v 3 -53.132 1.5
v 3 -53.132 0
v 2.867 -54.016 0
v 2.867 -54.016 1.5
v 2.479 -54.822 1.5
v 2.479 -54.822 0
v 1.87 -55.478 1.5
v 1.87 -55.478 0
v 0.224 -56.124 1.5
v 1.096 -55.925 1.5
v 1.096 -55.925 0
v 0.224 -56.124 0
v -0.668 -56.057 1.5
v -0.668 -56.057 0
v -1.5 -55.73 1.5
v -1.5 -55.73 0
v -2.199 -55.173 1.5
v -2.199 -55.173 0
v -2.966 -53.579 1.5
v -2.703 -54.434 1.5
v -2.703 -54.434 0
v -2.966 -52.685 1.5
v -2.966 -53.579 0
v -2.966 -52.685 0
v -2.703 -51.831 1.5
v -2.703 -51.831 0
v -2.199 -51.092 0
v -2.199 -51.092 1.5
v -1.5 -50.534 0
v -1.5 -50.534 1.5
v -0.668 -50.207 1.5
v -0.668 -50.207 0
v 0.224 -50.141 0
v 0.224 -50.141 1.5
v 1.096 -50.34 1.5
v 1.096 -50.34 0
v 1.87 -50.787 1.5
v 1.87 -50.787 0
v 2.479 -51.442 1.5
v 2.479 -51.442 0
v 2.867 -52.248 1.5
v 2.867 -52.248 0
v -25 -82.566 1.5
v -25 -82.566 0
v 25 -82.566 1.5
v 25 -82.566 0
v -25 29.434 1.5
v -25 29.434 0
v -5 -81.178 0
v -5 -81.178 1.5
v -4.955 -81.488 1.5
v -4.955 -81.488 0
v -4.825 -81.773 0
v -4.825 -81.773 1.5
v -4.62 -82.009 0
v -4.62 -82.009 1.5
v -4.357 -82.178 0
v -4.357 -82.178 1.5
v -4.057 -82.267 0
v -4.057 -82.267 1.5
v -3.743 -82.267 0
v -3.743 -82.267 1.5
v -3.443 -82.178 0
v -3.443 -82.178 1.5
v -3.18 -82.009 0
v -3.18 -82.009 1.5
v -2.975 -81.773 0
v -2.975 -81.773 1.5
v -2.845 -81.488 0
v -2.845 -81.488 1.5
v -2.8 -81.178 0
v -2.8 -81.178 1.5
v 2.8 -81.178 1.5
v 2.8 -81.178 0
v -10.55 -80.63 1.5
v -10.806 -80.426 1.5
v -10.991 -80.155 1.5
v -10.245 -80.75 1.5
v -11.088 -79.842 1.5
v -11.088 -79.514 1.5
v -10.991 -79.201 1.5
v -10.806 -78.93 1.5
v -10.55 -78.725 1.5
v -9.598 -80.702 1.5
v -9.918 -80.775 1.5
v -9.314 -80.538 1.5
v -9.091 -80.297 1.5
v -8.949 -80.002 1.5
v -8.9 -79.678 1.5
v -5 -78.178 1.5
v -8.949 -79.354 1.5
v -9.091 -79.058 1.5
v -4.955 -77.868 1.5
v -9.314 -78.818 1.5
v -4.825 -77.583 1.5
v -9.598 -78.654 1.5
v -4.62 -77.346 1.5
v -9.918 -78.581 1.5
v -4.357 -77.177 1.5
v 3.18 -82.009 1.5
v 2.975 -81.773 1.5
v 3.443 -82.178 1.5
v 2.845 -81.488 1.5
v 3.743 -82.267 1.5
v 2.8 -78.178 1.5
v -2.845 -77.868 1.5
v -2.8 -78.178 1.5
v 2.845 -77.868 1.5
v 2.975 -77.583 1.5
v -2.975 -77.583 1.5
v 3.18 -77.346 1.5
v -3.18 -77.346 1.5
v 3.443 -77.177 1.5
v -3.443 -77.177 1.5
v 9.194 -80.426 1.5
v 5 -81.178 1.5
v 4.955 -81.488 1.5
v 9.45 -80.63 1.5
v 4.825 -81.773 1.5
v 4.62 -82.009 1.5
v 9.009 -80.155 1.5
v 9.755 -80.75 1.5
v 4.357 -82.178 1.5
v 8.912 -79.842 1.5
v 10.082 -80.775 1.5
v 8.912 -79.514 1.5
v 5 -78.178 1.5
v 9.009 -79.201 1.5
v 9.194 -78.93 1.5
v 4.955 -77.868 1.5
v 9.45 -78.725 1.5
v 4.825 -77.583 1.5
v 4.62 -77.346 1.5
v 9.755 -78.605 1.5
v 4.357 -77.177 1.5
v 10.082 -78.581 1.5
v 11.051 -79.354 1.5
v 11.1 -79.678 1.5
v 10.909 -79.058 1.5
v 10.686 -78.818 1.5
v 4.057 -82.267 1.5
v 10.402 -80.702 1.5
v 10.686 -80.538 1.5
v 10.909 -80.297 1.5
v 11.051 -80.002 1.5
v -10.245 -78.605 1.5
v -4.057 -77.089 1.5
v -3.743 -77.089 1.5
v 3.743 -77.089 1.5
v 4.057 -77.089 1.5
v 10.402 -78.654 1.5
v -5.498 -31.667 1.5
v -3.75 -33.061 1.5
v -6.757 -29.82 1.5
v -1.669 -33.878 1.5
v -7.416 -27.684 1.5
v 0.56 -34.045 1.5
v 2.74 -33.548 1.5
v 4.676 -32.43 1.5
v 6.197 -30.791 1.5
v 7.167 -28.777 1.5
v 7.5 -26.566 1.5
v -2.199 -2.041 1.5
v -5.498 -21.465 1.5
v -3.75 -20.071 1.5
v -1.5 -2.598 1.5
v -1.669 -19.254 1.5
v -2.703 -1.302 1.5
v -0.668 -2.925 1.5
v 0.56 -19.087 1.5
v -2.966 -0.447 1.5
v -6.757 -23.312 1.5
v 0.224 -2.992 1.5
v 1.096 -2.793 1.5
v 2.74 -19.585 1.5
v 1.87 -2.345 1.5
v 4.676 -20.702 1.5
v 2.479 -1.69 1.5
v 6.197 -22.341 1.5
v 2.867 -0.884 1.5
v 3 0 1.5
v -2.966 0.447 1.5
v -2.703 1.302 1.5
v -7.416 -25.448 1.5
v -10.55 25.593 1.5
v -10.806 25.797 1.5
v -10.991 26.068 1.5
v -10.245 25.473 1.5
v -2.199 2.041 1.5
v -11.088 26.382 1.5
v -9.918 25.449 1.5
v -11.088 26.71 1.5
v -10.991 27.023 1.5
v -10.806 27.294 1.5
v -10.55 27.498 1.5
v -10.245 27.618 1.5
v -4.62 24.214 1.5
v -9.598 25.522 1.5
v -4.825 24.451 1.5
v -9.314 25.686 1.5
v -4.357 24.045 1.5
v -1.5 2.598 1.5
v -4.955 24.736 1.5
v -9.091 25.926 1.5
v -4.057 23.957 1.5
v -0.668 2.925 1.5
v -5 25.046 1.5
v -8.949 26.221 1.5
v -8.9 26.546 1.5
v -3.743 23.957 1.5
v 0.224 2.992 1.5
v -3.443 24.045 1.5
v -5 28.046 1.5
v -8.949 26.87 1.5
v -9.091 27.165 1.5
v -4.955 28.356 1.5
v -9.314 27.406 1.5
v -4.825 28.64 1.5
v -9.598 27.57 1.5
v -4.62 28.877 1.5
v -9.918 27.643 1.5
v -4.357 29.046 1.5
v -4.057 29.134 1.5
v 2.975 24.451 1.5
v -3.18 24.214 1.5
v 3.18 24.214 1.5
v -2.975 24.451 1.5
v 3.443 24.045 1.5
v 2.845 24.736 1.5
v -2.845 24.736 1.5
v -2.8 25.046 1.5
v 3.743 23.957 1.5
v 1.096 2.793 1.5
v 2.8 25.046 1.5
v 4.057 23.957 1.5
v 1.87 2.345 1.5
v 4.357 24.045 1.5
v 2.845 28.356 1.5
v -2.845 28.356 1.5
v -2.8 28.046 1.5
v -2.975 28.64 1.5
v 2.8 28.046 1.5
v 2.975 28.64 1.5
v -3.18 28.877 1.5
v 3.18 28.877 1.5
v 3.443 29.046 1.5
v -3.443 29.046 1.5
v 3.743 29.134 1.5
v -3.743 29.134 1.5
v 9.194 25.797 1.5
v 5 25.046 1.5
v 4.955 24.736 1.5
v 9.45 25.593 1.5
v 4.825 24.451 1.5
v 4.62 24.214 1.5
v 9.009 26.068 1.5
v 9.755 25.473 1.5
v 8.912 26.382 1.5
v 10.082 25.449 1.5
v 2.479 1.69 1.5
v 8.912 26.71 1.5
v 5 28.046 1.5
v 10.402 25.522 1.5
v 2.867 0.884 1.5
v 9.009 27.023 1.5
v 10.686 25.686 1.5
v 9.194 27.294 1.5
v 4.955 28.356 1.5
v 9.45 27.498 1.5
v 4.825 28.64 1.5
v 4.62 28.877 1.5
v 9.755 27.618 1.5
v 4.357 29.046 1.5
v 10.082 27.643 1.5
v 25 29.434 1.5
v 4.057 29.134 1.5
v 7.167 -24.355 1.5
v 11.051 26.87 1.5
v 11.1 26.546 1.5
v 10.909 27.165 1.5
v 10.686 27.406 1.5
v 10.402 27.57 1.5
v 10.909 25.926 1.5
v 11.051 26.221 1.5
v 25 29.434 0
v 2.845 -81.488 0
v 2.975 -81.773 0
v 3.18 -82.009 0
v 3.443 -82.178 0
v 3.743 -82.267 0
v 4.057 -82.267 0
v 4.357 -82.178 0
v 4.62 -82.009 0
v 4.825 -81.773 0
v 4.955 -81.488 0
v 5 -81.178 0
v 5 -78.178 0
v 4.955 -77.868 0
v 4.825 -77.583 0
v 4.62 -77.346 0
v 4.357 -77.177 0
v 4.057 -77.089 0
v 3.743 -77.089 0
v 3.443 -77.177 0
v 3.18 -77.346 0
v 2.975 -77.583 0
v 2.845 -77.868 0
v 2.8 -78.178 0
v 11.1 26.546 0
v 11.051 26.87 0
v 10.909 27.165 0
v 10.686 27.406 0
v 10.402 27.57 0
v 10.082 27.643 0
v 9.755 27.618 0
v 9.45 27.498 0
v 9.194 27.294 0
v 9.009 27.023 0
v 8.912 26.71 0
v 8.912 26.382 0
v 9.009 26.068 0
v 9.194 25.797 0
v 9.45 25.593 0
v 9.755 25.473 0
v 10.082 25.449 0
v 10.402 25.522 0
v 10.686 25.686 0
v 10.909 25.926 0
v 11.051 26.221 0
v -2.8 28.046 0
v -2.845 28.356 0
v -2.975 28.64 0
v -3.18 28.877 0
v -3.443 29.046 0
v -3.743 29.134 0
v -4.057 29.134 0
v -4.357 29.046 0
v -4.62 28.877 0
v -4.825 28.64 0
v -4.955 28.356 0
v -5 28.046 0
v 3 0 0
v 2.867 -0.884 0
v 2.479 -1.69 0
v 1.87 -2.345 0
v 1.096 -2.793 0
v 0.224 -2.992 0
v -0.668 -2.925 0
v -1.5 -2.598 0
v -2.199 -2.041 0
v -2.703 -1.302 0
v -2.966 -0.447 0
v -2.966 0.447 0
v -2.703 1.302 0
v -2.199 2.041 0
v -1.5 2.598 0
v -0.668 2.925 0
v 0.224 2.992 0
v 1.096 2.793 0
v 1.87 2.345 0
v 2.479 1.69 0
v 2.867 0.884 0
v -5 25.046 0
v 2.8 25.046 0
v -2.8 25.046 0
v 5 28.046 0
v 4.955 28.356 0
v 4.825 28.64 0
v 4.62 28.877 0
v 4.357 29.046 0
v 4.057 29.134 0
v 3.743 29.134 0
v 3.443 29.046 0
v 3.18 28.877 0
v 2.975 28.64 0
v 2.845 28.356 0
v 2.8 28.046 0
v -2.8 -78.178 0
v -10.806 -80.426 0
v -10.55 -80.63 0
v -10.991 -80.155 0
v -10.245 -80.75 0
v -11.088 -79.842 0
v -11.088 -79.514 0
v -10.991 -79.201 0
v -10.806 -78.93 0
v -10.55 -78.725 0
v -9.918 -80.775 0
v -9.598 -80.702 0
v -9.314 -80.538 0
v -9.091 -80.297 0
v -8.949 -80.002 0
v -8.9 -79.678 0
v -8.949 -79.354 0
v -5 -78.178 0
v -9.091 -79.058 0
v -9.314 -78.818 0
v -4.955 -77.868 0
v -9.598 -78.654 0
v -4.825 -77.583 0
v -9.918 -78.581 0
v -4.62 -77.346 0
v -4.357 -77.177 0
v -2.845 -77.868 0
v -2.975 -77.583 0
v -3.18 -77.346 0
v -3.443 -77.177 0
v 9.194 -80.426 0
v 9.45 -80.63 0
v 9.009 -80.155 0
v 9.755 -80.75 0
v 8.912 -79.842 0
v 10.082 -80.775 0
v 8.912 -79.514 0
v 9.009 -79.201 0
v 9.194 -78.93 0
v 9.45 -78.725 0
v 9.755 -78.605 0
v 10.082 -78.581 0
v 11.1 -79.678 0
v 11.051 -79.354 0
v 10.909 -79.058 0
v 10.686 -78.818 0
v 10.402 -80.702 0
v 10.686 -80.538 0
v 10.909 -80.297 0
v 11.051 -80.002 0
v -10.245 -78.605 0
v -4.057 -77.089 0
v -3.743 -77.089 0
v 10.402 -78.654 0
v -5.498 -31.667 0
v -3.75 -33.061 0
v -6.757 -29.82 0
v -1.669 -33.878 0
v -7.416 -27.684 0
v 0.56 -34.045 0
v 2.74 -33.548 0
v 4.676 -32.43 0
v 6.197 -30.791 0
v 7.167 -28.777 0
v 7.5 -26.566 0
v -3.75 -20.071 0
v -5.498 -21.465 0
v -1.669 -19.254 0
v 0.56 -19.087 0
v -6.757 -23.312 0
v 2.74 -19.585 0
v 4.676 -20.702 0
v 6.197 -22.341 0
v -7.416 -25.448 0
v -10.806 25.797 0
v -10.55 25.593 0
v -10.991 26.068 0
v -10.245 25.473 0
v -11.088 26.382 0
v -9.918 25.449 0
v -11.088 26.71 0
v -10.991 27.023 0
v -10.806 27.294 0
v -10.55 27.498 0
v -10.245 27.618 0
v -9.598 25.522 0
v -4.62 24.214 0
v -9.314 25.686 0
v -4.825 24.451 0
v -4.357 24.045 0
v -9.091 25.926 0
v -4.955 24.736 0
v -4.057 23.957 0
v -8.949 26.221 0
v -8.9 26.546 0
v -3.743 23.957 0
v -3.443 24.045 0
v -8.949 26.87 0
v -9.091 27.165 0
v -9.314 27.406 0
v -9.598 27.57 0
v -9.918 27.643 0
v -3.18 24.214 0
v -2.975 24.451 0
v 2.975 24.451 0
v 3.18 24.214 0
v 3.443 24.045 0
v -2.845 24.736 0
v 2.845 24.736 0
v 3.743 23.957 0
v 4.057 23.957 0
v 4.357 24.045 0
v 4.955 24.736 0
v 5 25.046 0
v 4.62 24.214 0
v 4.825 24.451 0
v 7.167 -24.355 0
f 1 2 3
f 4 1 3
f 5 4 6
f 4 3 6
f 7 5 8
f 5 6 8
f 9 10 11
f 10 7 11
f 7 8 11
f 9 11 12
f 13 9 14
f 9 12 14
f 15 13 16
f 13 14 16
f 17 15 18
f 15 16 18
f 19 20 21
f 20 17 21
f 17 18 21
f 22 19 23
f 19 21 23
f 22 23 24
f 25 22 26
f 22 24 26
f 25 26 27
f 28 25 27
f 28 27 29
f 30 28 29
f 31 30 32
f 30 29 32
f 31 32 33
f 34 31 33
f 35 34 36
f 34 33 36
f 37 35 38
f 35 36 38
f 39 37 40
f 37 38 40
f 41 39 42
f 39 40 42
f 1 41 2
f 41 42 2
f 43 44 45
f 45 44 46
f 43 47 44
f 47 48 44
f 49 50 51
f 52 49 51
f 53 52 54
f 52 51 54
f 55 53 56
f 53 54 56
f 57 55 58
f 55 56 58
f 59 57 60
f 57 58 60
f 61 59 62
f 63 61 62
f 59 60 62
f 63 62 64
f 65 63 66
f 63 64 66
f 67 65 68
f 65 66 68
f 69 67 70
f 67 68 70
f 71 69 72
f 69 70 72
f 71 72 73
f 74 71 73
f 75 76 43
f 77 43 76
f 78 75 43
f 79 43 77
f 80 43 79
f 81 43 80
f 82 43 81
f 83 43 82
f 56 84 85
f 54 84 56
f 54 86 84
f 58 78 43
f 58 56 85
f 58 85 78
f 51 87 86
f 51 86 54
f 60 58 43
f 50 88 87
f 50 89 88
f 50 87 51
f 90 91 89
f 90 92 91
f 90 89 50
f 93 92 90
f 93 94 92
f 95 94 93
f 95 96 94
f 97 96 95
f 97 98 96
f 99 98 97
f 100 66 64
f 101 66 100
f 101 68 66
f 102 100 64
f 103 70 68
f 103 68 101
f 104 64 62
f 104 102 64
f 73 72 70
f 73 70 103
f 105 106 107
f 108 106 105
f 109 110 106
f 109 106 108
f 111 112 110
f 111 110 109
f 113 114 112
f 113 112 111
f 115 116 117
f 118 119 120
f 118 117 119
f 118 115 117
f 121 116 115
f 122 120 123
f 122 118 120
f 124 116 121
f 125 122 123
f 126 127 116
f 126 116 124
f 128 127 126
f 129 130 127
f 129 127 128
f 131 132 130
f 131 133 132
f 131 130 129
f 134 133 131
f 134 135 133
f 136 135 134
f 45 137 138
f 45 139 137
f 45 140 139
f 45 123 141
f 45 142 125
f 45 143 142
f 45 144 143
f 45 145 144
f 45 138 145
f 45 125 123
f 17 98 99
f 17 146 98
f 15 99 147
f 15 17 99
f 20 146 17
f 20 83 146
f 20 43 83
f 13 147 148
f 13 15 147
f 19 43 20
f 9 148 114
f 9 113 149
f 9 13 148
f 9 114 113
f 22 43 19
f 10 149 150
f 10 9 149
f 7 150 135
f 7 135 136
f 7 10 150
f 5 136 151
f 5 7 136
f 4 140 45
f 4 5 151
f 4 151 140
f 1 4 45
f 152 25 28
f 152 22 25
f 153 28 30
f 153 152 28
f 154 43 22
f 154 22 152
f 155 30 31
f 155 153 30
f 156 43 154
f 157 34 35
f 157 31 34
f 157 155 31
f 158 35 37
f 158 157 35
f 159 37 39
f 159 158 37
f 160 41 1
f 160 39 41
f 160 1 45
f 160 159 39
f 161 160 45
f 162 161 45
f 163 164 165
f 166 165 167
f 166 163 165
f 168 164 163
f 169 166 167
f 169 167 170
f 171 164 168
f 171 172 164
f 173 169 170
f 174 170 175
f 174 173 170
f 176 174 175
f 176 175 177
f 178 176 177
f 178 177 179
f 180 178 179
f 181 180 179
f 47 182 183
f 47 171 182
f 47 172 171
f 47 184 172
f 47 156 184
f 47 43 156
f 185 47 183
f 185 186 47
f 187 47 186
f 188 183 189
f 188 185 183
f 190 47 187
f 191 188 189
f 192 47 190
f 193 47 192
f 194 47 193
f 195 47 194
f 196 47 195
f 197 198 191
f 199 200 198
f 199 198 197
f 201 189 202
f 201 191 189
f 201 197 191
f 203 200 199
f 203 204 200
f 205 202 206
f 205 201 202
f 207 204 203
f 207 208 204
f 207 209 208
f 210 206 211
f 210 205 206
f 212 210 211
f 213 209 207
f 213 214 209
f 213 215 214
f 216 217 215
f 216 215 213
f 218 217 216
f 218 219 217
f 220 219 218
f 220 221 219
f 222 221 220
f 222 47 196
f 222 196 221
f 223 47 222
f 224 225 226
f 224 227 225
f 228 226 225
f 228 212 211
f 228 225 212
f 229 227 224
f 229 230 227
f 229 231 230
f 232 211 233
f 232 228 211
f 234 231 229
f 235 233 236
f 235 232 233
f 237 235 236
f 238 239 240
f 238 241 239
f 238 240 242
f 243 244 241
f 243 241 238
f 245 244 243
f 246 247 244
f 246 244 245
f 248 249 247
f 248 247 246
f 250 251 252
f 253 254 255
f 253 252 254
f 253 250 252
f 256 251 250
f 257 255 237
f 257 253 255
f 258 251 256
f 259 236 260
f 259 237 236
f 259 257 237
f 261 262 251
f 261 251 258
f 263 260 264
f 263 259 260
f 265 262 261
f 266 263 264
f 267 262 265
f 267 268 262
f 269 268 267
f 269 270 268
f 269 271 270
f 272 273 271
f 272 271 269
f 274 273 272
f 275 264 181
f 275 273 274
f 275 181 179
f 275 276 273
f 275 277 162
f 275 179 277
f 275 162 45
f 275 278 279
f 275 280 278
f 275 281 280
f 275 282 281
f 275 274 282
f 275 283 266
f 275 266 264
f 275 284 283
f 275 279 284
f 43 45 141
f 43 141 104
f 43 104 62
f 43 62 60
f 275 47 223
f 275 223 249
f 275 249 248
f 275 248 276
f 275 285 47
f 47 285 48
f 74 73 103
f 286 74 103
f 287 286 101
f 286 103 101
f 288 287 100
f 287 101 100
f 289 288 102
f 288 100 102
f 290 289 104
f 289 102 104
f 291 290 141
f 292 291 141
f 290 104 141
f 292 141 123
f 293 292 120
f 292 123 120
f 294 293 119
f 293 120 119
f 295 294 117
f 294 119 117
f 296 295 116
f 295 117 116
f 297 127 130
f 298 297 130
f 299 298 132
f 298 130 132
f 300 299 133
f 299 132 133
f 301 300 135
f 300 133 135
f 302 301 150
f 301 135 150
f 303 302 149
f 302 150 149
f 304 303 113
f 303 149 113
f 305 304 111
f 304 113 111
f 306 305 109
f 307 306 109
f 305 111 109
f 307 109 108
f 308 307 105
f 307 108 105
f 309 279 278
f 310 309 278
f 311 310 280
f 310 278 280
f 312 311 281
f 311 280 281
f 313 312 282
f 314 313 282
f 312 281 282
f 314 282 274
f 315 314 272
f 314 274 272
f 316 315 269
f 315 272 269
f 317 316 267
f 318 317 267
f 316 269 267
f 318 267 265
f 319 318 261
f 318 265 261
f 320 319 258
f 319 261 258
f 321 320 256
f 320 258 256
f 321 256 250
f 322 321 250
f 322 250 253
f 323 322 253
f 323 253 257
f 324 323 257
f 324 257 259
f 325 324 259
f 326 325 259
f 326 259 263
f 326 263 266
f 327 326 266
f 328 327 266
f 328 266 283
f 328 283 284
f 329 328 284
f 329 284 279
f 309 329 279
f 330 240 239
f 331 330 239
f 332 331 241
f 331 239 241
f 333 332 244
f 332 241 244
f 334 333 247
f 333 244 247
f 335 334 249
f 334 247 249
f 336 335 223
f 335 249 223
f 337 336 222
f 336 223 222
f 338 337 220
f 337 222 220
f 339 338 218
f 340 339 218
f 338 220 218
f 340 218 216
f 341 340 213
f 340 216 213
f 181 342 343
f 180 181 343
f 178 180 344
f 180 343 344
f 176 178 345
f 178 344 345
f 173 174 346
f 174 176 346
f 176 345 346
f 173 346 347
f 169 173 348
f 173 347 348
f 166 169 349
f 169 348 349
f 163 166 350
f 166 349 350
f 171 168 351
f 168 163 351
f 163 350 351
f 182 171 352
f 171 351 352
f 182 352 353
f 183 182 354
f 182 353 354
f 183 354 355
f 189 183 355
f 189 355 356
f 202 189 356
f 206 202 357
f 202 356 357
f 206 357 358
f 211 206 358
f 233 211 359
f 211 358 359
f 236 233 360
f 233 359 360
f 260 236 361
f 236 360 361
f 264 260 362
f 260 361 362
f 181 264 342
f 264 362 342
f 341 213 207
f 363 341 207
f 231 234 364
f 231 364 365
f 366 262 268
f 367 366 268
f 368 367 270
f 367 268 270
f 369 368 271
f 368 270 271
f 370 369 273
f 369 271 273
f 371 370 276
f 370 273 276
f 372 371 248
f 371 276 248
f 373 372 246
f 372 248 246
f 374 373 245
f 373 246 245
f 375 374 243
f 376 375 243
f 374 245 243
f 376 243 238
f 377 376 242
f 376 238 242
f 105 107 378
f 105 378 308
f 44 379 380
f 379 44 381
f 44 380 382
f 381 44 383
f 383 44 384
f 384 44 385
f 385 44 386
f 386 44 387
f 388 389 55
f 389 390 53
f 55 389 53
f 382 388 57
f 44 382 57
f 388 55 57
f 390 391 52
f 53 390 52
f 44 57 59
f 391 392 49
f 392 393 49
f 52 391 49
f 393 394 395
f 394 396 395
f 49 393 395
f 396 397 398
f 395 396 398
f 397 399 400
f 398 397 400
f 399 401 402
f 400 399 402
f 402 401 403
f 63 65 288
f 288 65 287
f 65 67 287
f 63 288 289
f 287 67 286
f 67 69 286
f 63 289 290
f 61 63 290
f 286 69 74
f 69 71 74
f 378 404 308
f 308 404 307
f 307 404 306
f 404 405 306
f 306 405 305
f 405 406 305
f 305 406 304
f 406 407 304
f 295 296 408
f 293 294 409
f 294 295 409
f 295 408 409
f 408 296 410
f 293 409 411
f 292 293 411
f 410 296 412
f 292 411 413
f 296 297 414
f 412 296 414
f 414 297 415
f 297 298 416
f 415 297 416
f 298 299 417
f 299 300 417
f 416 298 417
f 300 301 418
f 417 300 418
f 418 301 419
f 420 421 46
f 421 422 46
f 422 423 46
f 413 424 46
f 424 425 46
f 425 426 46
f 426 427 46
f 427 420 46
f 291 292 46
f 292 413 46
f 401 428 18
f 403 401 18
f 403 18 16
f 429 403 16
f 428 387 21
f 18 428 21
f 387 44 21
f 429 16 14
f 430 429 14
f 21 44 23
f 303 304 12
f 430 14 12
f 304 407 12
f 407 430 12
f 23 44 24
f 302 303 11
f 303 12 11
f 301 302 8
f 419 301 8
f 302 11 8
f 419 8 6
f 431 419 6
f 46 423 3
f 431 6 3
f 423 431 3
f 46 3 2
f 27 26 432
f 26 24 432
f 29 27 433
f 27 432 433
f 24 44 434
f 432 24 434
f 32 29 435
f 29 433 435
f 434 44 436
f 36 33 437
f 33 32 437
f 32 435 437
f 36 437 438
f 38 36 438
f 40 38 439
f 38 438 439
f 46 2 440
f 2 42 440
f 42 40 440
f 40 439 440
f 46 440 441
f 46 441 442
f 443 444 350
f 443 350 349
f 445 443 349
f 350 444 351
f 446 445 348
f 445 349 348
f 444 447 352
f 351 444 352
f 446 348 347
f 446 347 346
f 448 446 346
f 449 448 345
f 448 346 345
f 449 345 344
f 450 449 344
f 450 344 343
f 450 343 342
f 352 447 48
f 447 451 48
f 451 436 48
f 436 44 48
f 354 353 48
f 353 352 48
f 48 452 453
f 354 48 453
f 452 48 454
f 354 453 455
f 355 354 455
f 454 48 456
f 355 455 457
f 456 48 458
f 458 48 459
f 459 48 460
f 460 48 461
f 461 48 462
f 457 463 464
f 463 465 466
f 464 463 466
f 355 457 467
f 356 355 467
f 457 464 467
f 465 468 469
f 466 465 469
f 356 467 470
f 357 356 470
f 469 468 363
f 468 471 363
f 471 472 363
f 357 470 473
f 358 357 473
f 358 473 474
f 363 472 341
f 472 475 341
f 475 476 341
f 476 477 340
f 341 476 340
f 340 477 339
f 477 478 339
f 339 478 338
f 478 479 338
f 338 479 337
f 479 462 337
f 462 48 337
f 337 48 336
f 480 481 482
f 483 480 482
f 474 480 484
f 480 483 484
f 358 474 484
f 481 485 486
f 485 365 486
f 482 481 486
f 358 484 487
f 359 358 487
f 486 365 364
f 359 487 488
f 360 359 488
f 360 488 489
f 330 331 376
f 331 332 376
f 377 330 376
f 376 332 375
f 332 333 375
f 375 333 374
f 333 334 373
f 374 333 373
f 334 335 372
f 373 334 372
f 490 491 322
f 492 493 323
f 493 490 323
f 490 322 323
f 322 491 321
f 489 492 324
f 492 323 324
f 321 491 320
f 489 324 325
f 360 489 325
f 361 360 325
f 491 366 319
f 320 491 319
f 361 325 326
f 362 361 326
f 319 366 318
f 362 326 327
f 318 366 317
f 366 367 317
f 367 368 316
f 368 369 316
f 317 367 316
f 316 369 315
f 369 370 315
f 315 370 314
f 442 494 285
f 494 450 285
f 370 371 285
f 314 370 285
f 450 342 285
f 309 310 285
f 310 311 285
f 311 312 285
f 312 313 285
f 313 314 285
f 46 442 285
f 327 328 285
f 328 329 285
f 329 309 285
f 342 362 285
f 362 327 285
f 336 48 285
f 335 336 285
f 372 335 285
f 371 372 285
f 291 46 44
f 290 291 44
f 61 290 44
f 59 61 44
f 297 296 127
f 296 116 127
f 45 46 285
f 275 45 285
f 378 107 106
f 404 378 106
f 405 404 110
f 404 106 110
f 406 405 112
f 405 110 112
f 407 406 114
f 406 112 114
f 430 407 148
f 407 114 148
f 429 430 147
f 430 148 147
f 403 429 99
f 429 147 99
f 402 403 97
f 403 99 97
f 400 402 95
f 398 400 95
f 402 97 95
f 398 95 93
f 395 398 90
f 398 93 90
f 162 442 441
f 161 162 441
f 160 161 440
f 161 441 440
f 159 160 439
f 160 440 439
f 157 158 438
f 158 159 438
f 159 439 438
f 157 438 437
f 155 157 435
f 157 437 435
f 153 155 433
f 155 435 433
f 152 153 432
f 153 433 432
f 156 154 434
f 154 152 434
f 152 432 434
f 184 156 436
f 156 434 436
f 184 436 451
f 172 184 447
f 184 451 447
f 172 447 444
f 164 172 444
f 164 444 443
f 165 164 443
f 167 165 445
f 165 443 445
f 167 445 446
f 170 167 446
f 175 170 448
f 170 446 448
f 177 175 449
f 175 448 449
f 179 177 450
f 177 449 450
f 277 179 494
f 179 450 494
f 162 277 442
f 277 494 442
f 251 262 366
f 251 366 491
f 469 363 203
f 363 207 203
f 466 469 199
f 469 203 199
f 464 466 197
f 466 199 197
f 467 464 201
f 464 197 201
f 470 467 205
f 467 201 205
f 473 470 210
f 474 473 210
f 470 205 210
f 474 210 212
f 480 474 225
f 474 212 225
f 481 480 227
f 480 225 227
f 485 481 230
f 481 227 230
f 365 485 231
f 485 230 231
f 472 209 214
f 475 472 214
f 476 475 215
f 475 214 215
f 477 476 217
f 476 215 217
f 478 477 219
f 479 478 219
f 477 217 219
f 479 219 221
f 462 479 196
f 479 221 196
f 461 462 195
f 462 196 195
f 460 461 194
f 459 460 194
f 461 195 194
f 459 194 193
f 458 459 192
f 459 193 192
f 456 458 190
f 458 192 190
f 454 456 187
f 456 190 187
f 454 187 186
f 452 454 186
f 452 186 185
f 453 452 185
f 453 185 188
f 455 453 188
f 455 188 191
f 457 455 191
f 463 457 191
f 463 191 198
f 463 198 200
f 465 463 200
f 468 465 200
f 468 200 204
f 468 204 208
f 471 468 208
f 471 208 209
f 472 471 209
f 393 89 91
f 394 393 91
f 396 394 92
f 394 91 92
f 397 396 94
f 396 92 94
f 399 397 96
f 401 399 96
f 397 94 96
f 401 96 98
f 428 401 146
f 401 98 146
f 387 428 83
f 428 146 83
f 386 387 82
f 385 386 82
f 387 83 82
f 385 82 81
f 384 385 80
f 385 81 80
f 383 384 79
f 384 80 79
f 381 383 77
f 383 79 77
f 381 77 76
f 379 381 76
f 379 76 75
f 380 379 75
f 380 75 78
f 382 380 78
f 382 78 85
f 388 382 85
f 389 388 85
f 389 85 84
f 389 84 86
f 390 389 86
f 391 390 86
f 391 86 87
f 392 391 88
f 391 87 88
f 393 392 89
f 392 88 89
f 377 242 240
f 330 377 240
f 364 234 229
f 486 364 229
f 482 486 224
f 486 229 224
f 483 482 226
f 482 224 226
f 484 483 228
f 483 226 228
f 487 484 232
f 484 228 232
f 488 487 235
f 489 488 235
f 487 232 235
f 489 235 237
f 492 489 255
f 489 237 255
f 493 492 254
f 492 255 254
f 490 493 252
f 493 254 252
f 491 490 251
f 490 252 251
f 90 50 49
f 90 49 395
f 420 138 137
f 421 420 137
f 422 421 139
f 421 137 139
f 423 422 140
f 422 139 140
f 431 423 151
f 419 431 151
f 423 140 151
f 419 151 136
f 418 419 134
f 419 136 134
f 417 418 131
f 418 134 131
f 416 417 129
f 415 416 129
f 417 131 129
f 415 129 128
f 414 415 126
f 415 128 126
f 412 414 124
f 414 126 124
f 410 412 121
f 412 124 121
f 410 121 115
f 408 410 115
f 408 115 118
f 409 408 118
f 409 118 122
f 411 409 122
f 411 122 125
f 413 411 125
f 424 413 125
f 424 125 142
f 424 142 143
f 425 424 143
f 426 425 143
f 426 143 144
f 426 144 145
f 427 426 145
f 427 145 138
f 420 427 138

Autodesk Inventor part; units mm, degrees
ref_plane "YZ Plane" through (0, 0, 0) normal (1, 0, 0) x (0, 1, 0)
ref_plane "XZ Plane" through (0, 0, 0) normal (0, 1, 0) x (-1, 0, 0)
ref_plane "XY Plane" through (0, 0, 0) normal (0, 0, 1) x (1, 0, 0)
sketch "スケッチ1" plane through (0, 0, 0) normal (0, 0, 1) x (1, 0, 0)
  circle A0 centre (0, 0) radius 1.75 projected
  circle A1 centre (0, 0) radius 3
  circle A2 centre (0, -53.1322) radius 1.75 projected
  circle A3 centre (0, -53.1322) radius 3
  line L0 (0, 0) -> (0, -53.1322) construction
  circle A4 centre (0, -26.5661) radius 7.5
  line L1 (25, 29.4339) -> (-25, 29.4339)
  line L2 (-25, 29.4339) -> (-25, -82.5661)
  line L3 (-25, -82.5661) -> (25, -82.5661)
  line L4 (25, -82.5661) -> (25, 29.4339)
  line L5 (25, 29.4339) -> (-25, -82.5661) construction
  line L6 (-25, 29.4339) -> (25, -82.5661) construction
  line L7 (25, -26.5661) -> (0, -26.5661) construction
  circle A5 centre (-10, -79.6778) radius 0.7835 projected
  point P0 (0, 0)
  point P1 (5, 29.4339)
  point P2 (-5, 29.4339)
  dimension "d0" = 6
  dimension "d1" = 6
  dimension "d2" = 15
  dimension "d4" = 50
  dimension "d14" = 112
extrude "押し出し1" add sketch "スケッチ1" along normal blind 1.5 contours L4 L3 L2 L1 | A5
sketch "スケッチ2" plane through (0, 0, 1.5) normal (0, 0, 1) x (1, 0, 0)
  line L0 (-5, -78.1778) -> (5, -78.1778) projected
  line L1 (-5, -81.1778) -> (5, -81.1778) projected
  line L2 (-5, -81.1778) -> (-5, -78.1778) projected
  line L3 (5, -81.1778) -> (5, -78.1778) projected
  circle A0 centre (-10, -79.6778) radius 0.7835 projected
  circle A1 centre (10, -79.6778) radius 0.7835 projected
  line L4 (5, 25.0456) -> (-5, 25.0456) projected
  line L5 (5, 28.0456) -> (-5, 28.0456) projected
  line L6 (-5, 28.0456) -> (-5, 25.0456) projected
  line L7 (5, 28.0456) -> (5, 25.0456) projected
  circle A2 centre (-10, 26.5456) radius 0.7835 projected
  circle A3 centre (10, 26.5456) radius 0.7835 projected
  circle A4 centre (3.9, -78.1778) radius 1.1
  line L8 (0, -78.1778) -> (0, -81.1778) construction
  line L9 (0, -79.6778) -> (-5, -79.6778) construction
  circle A5 centre (3.9, -81.1778) radius 1.1
  circle A6 centre (-3.9, -78.1778) radius 1.1
  circle A7 centre (-3.9, -81.1778) radius 1.1
  line L10 (-25, 29.4339) -> (-25, -82.5661) construction
  line L11 (-25, -26.5661) -> (25, -26.5661) construction
  line L12 (25, -82.5661) -> (25, 29.4339) construction
  circle A8 centre (3.9, 25.0456) radius 1.1
  circle A9 centre (3.9, 28.0456) radius 1.1
  circle A10 centre (-3.9, 28.0456) radius 1.1
  circle A11 centre (-3.9, 25.0456) radius 1.1
  circle A12 centre (-10, -79.6778) radius 1.1
  circle A13 centre (10, -79.6778) radius 1.1
  circle A14 centre (-10, 26.5456) radius 1.1
  circle A15 centre (10, 26.5456) radius 1.1
  point P0 (0, 0)
  point P1 (2.8, 25.0456)
  point P2 (-2.8, 25.0456)
  point P3 (-2.8, 28.0456)
  point P4 (2.8, -81.1778)
  point P5 (2.8, -78.1778)
  point P6 (-2.8, -81.1778)
  point P7 (-2.8, -78.1778)
  point P8 (2.8, 28.0456)
  dimension "d17" = 2.2
  dimension "d18" = 2.2
  dimension "d19" = 2.2
  dimension "d20" = 2.2
  dimension "d21" = 2.2
extrude "押し出し2" cut sketch "スケッチ2" against normal through all contours A6 L0 | A6 L0 A4 L3 A5 L1 A7 L2 | L0 A6 | A7 L1 | L1 A7 | A4 L0 | L0 A4 | A5 L1 | L1 A5 | A0 | A1 | A11 L4 | A11 L6 A10 L5 A9 L7 A8 L4 | L4 A11 | A8 L4 | L4 A8 | A10 L5 | L5 A10 | A9 L5 | L5 A9 | A2 | A3 | A12 | A13 | A14 | A15
properties part number "kosisita"
